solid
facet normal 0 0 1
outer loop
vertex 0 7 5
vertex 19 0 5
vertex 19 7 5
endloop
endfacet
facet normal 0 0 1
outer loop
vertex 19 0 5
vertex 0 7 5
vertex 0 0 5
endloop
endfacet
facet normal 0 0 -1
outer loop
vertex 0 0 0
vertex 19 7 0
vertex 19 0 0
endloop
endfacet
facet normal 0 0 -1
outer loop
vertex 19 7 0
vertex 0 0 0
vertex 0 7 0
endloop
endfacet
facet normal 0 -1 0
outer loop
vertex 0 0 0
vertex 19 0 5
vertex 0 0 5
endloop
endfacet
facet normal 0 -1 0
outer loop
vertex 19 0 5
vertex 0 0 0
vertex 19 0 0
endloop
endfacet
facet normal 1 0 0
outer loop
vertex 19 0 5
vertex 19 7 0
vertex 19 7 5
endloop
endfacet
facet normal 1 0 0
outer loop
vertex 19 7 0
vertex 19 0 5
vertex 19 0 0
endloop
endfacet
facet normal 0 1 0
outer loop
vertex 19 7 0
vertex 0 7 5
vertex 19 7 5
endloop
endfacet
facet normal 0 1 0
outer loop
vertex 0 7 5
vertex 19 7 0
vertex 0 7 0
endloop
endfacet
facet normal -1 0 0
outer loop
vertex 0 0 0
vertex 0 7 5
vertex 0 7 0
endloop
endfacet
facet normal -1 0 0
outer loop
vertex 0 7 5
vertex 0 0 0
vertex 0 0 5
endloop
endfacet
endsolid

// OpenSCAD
// Generated by SolidPython 1.0.1 on 2020-07-29 00:46:56


cube(size = [19, 7, 5]);
/***********************************************
*********      SolidPython code:      **********
************************************************
 
# import packages: SolidPython
from solid import *
from solid.utils import *
from itertools import chain, combinations, permutations


class Resize:

    def __init__(self, scad_file):
        self.scad_file = scad_file
        #self.scad_file = import_scad(scad_file)
        # cone/cylinder param:
        self.r1 = 0
        self.r2 = 0
        self.h = 0
        # rectangular prism param:
        self.w = 0
        self.l = 0
        # ellipse param:
        self.r = 0

    # import OpenScad code (file name corresponds to shape)


    # classify shape + parameters
    def assign(self, param1, param2, param3):
        if self.scad_file == 'cone.scad':
            self.r1 = param1
            self.r2 = param2
            self.h = param3
        elif self.scad_file == 'cylinder.scad':
            self.r1 = param1
            self.r2 = param2
            self.h = param3
        elif self.scad_file == 'rectangularPrism.scad':
            self.h = param1
            self.l = param2
            self.w = param3
        else:
            self.r = param1
            self.h = param2

    # resize parameters
    def iterate(self):
        x = range(3, 20, 2)
        i = 1
        if self.scad_file == 'cone.scad':
            tempList = list(permutations(x, 2))
            for temp in tempList:
                param1 = temp[0]
                param2 = temp[1]
                filepath = 'produced_scad_files/' + 'cone' + str(param1) + '_' + str(param2) + '_' + '.scad'
                scad_render_to_file(cylinder(h=param1, r1=param2, r2=0), filepath)

        elif self.scad_file == 'cylinder.scad':
            tempList = list(permutations(x, 3))
            for temp in tempList:
                param1 = temp[0]
                param2 = temp[1]
                filepath = 'produced_scad_files/' + 'cylinder' + str(param1) + '_' + str(param2) + '_' + '.scad'
                scad_render_to_file(cylinder(h=param1, r1=param2, r2=param2), filepath)

        elif self.scad_file == 'rectangularPrism.scad':
            tempList = list(permutations(x, 3))
            for temp in tempList:
                param1 = temp[0]
                param2 = temp[1]
                param3 = temp[2]
                filepath = 'produced_scad_files/' + 'rectangularPrism' + str(param1) + '_' + str(param2) + '_' + str(
                    param3) + '.scad'
                scad_render_to_file(cube(size=(param1, param2, param3)), filepath)

        elif self.scad_file == 'ellipse.scad':
            tempList = list(permutations(x, 4))
            for temp in tempList:
                param1 = temp[0]
                param2 = temp[1]
                param3 = temp[2]
                param4 = temp[3]
                filepath = 'produced_scad_files/' + 'ellipse' + str(param1) + '_' + str(param2) + '_' + str(param3) + '_' + str(param4) + '.scad'
                scad_render_to_file(scale([param1, param2, param3])(sphere(r=param4)), filepath)

    def render_to_scadfile(self):
        scad_render_to_file(scad, 'example.scad') 
 
************************************************/
